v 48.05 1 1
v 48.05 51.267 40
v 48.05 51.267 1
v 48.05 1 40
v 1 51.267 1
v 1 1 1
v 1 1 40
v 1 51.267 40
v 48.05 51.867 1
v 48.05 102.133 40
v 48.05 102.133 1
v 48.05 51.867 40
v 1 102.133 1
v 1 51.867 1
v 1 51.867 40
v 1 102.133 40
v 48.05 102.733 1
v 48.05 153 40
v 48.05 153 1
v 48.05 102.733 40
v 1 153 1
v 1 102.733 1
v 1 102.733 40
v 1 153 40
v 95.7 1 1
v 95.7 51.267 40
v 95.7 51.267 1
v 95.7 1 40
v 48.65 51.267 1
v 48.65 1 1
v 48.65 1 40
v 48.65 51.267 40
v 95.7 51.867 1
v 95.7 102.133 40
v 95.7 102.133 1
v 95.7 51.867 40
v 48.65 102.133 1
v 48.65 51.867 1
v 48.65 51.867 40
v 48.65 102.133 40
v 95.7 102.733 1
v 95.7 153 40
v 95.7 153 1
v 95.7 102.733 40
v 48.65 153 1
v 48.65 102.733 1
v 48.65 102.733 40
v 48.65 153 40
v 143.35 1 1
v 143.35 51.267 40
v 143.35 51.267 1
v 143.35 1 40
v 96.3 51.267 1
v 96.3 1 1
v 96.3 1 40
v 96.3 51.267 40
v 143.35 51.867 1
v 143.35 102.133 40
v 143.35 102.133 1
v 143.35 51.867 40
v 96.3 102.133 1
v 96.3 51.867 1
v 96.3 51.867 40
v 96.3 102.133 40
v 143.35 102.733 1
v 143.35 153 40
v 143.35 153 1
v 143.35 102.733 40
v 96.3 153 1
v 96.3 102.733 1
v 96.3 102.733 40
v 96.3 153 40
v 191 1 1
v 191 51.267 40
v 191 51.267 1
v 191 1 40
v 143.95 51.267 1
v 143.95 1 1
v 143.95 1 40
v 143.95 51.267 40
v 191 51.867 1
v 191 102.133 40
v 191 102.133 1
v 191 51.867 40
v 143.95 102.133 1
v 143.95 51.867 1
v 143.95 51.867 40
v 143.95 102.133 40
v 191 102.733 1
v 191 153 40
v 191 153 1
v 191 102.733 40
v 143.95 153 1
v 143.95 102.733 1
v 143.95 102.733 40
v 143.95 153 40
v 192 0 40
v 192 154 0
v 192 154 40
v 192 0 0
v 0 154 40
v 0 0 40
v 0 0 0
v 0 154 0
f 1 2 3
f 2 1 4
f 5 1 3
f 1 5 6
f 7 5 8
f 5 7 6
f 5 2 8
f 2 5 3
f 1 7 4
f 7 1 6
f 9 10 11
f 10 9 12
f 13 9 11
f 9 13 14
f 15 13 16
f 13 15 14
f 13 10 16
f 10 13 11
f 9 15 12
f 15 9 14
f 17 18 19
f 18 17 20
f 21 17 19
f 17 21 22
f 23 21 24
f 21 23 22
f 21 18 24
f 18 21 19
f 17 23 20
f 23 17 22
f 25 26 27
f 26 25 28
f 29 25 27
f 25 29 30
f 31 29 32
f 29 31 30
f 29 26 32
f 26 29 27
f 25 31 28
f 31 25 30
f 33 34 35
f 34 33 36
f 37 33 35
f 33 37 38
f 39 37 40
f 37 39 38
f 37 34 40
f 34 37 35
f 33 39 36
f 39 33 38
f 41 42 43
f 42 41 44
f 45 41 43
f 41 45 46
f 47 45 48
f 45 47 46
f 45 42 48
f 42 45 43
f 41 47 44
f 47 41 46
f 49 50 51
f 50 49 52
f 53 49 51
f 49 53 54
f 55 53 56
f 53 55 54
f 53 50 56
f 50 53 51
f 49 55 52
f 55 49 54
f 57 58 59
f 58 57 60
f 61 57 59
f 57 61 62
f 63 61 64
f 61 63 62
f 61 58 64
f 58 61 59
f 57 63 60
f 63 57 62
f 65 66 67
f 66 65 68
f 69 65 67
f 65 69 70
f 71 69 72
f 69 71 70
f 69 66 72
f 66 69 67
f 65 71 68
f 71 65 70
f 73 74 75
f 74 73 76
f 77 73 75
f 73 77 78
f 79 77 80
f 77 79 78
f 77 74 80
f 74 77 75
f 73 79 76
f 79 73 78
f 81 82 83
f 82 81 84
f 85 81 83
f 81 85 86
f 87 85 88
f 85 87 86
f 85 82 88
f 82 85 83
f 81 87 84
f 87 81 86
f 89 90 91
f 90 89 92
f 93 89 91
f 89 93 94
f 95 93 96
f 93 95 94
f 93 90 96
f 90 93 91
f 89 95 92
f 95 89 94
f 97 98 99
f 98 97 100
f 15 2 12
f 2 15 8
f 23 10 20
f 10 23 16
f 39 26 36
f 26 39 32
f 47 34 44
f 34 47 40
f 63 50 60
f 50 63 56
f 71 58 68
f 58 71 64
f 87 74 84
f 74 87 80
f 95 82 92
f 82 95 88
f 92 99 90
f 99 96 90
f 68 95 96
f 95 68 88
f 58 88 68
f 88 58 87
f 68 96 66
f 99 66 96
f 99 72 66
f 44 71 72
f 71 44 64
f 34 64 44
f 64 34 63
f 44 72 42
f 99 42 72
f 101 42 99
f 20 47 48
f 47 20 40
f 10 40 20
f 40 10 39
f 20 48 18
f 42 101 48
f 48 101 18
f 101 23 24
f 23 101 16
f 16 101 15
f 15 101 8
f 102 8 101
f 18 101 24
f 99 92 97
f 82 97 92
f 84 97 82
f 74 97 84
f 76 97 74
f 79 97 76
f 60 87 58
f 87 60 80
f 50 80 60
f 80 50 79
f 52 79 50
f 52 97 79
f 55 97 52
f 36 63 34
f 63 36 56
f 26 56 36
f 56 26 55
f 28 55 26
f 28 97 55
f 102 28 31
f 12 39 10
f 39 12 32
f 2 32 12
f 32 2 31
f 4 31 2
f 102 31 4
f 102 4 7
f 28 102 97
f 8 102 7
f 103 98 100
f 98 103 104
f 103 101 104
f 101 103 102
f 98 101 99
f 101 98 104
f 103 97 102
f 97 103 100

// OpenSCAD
/////////////////Parameters
/* [Sizes] */
// total width
tw =192; // [20:250]
// total length
tl = 154; // [20:250]
// height
owh = 40; // [10:100]
// boxes in width direction
nw=4; // [1:10]
// boxes in length direction
nl=3; // [1:10]
// outer wall width
oww = 1; // [0:3]
// inner wall width 
iww = 0.6; // [0:3]
/* [Hidden] */

//drawing

boxes(nw,nl,oww,iww,owh,(tw-2*oww+iww)/nw,(tl-2*oww+iww)/nl);

//////////////////Calculations + modules

module boxes(nbw,nbl,ow,iw,oh,boxw,boxl) {
	difference() {
		cube([nbw*boxw+ow+ow-iw,nbl*boxl+ow+ow-iw,oh]);
		for (i=[0:nbw-1])
			for (j=[0:nbl-1])
				translate([i*boxw+ow,j*boxl+ow,ow])
					#cube([boxw-iw,boxl-iw,oh]);
	}
}

